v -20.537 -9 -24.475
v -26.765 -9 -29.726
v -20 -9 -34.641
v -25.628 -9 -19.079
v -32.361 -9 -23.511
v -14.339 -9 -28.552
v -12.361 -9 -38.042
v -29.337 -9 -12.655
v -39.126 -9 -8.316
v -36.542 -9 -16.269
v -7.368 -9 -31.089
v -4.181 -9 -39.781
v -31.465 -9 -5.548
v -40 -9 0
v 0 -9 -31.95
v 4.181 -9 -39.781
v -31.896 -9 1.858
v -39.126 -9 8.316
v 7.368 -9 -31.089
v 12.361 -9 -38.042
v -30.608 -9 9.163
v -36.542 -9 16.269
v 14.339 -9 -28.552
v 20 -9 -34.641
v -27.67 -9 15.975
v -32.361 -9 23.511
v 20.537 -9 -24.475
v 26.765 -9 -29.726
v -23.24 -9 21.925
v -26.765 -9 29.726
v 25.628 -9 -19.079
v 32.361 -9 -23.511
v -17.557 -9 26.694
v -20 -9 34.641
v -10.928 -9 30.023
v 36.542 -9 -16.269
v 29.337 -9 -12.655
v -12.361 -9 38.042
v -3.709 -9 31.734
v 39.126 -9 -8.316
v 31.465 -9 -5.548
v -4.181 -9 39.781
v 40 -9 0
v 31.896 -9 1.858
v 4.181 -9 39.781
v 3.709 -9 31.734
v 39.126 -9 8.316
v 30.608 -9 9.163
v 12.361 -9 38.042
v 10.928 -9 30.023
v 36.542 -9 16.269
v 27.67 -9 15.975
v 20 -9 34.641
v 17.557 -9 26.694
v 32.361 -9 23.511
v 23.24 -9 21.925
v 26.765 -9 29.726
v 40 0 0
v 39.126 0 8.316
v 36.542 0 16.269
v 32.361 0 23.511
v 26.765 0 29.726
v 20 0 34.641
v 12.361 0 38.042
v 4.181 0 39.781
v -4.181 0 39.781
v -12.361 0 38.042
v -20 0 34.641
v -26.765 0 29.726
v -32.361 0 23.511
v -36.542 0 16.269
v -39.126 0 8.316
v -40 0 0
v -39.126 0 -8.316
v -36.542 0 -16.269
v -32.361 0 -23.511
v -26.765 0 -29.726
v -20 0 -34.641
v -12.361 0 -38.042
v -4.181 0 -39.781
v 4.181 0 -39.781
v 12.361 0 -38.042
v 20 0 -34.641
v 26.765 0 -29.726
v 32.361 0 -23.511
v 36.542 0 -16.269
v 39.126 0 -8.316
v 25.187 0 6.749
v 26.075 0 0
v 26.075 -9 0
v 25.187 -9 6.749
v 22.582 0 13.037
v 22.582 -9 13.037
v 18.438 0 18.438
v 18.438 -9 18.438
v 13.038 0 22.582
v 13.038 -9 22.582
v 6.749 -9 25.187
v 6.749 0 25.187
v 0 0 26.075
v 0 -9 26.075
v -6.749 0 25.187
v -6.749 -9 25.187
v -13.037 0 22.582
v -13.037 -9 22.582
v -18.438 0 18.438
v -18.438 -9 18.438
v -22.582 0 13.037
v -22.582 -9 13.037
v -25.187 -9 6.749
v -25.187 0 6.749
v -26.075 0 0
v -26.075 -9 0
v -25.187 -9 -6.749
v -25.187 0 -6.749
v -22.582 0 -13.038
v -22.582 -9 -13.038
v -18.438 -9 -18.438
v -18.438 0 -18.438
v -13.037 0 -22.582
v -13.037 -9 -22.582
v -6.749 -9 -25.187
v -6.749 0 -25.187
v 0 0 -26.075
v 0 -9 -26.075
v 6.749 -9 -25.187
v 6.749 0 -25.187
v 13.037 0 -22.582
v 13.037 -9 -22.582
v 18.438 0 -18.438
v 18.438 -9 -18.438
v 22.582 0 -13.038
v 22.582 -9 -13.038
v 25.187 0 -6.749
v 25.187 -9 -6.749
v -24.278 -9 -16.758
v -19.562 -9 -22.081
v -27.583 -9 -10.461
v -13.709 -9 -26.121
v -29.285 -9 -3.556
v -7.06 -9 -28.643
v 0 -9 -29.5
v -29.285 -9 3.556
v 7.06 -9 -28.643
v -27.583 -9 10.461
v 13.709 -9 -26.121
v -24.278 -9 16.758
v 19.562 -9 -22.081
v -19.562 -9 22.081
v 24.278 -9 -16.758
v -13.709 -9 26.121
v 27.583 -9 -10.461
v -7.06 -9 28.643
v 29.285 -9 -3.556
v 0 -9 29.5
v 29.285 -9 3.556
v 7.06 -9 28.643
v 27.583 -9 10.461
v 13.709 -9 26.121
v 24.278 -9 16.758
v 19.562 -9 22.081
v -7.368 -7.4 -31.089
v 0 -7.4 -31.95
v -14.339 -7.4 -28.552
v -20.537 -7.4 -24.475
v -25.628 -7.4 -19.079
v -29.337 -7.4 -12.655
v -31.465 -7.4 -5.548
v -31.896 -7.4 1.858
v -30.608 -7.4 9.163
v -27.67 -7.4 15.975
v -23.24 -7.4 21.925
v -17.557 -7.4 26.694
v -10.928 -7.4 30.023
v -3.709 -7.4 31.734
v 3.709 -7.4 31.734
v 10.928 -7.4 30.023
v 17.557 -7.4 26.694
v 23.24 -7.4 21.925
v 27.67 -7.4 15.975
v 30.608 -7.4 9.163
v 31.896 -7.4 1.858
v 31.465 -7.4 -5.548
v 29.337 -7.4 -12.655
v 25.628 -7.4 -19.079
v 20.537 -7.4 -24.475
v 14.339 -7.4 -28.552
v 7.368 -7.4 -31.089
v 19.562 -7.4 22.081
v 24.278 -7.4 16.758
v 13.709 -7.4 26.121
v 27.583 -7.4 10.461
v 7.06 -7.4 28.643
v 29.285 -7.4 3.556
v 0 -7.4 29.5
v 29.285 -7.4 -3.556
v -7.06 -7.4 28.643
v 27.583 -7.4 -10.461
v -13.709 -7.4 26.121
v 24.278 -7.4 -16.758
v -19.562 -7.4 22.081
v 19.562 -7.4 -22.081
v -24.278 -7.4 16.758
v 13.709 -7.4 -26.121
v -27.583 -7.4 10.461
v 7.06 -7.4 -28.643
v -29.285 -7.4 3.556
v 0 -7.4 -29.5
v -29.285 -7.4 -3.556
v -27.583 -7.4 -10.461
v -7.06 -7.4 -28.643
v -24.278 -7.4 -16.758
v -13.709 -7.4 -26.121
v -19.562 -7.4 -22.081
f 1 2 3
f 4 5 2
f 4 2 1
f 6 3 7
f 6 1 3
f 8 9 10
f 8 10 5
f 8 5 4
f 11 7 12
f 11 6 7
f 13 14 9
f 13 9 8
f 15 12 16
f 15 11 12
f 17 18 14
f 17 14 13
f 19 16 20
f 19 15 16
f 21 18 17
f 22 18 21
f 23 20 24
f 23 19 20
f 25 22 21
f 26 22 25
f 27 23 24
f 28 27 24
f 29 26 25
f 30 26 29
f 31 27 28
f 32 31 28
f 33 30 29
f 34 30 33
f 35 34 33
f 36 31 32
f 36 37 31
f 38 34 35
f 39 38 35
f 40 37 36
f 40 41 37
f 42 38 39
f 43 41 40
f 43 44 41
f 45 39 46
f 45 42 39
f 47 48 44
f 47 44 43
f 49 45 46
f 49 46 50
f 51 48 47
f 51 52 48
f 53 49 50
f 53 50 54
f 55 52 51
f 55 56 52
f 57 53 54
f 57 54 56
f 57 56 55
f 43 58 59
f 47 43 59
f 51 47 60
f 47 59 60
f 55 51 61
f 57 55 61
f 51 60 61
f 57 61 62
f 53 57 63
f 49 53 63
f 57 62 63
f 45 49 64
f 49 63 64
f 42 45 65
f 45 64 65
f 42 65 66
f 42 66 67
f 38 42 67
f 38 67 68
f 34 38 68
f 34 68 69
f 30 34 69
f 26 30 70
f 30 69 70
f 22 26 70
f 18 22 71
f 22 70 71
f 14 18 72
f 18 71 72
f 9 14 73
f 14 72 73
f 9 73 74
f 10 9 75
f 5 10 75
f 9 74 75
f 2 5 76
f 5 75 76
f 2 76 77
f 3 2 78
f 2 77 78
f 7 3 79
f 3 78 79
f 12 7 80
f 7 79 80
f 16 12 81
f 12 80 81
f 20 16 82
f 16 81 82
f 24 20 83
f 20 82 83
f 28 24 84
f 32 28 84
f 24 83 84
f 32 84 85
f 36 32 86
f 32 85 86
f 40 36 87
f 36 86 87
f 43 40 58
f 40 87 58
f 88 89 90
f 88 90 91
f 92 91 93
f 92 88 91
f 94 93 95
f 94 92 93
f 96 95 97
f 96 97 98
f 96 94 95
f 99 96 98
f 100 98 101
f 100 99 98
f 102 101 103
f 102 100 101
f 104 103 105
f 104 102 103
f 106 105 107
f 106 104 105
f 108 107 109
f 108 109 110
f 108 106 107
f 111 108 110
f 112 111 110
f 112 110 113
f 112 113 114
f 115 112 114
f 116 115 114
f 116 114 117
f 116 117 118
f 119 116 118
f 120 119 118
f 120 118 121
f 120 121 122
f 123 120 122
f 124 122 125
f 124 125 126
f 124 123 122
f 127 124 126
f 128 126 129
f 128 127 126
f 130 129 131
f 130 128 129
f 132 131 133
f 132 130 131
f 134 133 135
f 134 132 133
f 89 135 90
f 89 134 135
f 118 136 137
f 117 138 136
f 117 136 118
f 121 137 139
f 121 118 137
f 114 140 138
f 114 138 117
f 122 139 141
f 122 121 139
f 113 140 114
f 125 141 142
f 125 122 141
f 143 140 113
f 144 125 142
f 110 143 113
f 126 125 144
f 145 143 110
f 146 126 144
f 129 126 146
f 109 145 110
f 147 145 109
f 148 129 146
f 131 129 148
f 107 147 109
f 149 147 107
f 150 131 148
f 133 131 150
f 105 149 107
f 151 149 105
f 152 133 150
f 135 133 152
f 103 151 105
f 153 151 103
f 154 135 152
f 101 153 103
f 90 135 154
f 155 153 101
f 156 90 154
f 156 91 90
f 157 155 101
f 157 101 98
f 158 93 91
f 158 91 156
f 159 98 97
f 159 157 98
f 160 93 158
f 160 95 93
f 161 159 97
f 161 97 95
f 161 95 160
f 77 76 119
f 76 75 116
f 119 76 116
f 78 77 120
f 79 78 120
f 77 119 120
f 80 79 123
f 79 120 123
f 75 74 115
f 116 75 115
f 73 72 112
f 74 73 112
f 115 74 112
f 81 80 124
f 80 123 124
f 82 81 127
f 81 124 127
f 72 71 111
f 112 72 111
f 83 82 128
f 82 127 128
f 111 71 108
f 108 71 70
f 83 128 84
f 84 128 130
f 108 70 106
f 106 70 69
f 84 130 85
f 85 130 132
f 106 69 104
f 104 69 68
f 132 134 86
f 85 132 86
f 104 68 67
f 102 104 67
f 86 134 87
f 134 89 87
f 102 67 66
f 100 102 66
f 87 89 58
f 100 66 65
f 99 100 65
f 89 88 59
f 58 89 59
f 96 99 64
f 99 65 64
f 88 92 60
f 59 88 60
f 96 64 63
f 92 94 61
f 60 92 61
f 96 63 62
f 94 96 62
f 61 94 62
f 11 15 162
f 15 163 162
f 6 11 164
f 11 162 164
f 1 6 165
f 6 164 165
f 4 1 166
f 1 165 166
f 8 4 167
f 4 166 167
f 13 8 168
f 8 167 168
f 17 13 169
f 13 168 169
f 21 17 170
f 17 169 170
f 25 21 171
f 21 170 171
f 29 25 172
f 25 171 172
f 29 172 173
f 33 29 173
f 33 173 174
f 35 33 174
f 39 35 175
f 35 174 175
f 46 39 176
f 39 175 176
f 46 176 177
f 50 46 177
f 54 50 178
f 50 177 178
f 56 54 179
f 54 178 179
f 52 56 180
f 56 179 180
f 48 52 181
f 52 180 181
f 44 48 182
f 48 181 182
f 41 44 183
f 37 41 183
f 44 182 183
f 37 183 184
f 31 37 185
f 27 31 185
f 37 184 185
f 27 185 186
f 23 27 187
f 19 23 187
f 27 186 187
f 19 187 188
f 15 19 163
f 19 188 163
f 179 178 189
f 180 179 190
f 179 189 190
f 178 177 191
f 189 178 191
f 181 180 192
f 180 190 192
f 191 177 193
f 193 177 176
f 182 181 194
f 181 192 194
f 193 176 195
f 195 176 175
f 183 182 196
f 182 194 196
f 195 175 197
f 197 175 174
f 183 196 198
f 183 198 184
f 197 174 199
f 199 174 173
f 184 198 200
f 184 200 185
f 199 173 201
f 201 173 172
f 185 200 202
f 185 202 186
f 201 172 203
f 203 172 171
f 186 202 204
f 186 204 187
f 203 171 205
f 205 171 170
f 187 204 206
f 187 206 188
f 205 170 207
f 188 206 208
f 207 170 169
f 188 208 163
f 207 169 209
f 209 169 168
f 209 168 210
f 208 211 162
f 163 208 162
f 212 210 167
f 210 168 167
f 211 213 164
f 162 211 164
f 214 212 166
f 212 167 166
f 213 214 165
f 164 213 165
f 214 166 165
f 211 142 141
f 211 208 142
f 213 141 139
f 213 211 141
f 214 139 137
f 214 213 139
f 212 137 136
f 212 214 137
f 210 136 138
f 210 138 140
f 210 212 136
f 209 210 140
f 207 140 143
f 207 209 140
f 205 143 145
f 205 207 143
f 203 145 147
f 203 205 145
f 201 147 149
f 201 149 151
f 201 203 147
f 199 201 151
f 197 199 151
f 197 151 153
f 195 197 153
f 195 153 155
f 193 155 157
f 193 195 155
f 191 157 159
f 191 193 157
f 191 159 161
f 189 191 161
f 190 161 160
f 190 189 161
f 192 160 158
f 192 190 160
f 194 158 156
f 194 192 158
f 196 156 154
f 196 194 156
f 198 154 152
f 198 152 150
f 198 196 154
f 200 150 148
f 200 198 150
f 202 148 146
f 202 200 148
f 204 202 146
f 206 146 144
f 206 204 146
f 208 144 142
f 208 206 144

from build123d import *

# Parameters (mm, degrees)
F0_R     = 40
F0_R_2   = 26.075
F1_DEPTH = 9
F2_W     = 1.6
F2_H     = 2.45


with BuildPart() as f1:
    # F0 (on Front) → F1 (new body)
    with BuildSketch(Plane.XZ):
        Circle(F0_R)
        Circle(F0_R_2, mode=Mode.SUBTRACT)
    extrude(amount=F1_DEPTH)

    # F2 (on Right) → F3 (revolve, cut)
    with BuildSketch(Plane.YZ):
        with Locations((-8.2, -30.725)):
            Rectangle(F2_W, F2_H)
    revolve(axis=Axis((0, 0, 0), (0, 1, 0)), mode=Mode.SUBTRACT)


solid = f1.part
